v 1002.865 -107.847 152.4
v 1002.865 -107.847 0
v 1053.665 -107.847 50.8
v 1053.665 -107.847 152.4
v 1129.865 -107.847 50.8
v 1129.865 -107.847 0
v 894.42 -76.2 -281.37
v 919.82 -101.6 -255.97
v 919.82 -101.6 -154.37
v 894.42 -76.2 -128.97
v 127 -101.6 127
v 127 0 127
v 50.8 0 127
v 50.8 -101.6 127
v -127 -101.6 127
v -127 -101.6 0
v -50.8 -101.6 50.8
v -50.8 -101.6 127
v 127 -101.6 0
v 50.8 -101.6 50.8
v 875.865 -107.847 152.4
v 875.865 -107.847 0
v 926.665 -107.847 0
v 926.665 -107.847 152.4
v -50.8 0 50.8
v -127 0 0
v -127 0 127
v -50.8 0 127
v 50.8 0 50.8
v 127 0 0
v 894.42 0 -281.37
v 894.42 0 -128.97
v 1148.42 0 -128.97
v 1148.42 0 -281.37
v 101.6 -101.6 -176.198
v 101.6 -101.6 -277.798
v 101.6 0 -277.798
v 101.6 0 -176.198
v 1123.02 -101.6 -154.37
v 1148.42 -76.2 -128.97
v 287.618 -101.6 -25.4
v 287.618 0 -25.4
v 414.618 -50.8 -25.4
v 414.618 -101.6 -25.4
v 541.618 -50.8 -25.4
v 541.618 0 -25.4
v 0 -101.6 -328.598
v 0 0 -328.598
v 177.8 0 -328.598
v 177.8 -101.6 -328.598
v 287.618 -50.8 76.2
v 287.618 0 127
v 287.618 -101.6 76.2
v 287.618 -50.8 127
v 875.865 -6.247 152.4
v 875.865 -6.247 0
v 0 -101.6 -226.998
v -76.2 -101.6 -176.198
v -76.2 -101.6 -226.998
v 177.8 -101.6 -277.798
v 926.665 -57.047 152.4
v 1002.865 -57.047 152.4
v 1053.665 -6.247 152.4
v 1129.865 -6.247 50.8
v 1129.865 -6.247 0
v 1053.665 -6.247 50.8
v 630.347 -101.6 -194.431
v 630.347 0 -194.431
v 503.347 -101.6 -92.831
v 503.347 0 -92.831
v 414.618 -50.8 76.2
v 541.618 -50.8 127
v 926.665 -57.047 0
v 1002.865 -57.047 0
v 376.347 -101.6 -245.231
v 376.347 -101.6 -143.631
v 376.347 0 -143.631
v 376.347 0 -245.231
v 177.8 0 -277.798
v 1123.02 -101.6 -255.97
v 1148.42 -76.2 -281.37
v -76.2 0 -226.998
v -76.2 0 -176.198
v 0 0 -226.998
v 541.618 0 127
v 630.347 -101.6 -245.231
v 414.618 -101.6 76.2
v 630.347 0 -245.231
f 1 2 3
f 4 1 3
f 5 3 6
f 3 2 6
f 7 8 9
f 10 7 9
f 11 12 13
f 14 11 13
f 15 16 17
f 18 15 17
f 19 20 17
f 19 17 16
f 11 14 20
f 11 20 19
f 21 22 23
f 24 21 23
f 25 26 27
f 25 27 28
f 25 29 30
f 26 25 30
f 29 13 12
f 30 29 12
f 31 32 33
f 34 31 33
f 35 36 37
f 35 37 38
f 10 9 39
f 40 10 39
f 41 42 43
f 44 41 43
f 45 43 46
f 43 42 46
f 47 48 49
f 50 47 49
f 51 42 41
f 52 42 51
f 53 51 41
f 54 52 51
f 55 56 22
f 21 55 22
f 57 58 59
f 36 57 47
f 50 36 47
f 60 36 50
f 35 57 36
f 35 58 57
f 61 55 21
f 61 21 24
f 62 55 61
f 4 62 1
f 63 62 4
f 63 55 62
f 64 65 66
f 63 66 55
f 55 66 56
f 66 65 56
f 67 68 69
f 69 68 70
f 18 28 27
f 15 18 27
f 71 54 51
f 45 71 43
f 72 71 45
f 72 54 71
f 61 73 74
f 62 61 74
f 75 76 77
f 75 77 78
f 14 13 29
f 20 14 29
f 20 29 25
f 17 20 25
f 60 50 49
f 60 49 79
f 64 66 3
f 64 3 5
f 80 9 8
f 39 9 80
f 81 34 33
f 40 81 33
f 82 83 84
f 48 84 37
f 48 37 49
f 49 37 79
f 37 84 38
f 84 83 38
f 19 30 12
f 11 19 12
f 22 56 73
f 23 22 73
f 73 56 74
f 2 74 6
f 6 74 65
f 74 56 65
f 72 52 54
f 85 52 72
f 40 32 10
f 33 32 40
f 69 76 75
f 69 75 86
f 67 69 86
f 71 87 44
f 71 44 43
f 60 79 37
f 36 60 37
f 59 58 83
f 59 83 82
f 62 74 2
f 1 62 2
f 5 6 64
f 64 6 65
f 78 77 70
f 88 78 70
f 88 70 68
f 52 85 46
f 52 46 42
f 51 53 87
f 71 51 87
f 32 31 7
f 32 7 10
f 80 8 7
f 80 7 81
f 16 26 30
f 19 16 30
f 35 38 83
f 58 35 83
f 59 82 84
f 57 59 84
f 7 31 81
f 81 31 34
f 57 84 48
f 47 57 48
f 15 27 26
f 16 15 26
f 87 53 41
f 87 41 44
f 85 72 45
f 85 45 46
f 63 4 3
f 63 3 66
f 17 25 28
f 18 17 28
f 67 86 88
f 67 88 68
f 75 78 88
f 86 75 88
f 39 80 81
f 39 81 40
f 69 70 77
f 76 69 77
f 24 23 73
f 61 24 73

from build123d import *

# Parameters (mm, degrees)
F1_DEPTH  = 101.6
F3_DEPTH  = 152.4
F4_W      = 127
F4_H      = 50.8
F5_DEPTH  = 50.8
F7_DEPTH  = 152.4
F8_W      = 76.2
F8_H      = 101.6
F9_DEPTH  = 101.6
F11_DEPTH = 101.6
F13_DEPTH = 101.6
F14_W     = 254
F14_H     = 152.4
F15_DEPTH = 101.6
F16_SIZE  = 25.4


with BuildPart() as f1:
    # F0 (on Front) → F1 (new body)
    with BuildSketch(Plane.XZ):
        Polygon((-127, 0), (0, 0), (127, 0), (127, 127), (50.8, 127), (50.8, 50.8), (-50.8, 50.8), (-50.8, 127), (-127, 127), align=None)
    extrude(amount=F1_DEPTH)


with BuildPart() as f3:
    # F2 (on face) → F3 (new body)
    with BuildSketch(Plane.XY.offset(127)):
        Polygon((541.617712, 0), (287.617712, 0), (287.617712, -101.6), (414.617712, -101.6), (414.617712, -50.8), (541.617712, -50.8), align=None)
    extrude(amount=-F3_DEPTH)

    # F4 (on face) → F5 (cut)
    with BuildSketch(Plane.XZ.offset(101.6)):
        with Locations((351.117712, 101.6)):
            Rectangle(F4_W, F4_H)
    extrude(amount=-F5_DEPTH, mode=Mode.SUBTRACT)


with BuildPart() as f7:
    # F6 (on Top) → F7 (new body)
    with BuildSketch(Plane.XY):
        Polygon((1129.865102, -6.247375), (875.865102, -6.247375), (875.865102, -107.847375), (926.665102, -107.847375), (926.665102, -57.047375), (1002.865102, -57.047375), (1002.865102, -107.847375), (1129.865102, -107.847375), align=None)
    extrude(amount=F7_DEPTH)

    # F8 (on face) → F9 (cut)
    with BuildSketch(Plane.XY.offset(152.4)):
        with Locations((1091.765102, -57.047375)):
            Rectangle(F8_W, F8_H)
    extrude(amount=-F9_DEPTH, mode=Mode.SUBTRACT)


with BuildPart() as f11:
    # F10 (on Front) → F11 (new body)
    with BuildSketch(Plane.XZ):
        Polygon((101.6, -176.197618), (-76.2, -176.197618), (-76.2, -226.997618), (0, -226.997618), (0, -328.597618), (177.8, -328.597618), (177.8, -277.797618), (101.6, -277.797618), align=None)
    extrude(amount=F11_DEPTH)


with BuildPart() as f13:
    # F12 (on Front) → F13 (new body)
    with BuildSketch(Plane.XZ):
        Polygon((503.346558, -92.831268), (376.346558, -143.631268), (376.346558, -245.231268), (630.346558, -245.231268), (630.346558, -194.431268), align=None)
    extrude(amount=F13_DEPTH)


with BuildPart() as f15:
    # F14 (on Front) → F15 (new body)
    with BuildSketch(Plane.XZ):
        with Locations((1021.420248, -205.169693)):
            Rectangle(F14_W, F14_H)
    extrude(amount=F15_DEPTH)

    # F16
    f16_edges = [f15.edges().sort_by_distance(p)[0] for p in [
        (1021.420248, -101.6, -128.969693),
        (1148.420248, -101.6, -205.169693),
        (894.420248, -101.6, -205.169693),
        (1021.420248, -101.6, -281.369693),
    ]]
    chamfer(f16_edges, length=F16_SIZE)


solid = Compound([f1.part, f3.part, f7.part, f11.part, f13.part, f15.part])
